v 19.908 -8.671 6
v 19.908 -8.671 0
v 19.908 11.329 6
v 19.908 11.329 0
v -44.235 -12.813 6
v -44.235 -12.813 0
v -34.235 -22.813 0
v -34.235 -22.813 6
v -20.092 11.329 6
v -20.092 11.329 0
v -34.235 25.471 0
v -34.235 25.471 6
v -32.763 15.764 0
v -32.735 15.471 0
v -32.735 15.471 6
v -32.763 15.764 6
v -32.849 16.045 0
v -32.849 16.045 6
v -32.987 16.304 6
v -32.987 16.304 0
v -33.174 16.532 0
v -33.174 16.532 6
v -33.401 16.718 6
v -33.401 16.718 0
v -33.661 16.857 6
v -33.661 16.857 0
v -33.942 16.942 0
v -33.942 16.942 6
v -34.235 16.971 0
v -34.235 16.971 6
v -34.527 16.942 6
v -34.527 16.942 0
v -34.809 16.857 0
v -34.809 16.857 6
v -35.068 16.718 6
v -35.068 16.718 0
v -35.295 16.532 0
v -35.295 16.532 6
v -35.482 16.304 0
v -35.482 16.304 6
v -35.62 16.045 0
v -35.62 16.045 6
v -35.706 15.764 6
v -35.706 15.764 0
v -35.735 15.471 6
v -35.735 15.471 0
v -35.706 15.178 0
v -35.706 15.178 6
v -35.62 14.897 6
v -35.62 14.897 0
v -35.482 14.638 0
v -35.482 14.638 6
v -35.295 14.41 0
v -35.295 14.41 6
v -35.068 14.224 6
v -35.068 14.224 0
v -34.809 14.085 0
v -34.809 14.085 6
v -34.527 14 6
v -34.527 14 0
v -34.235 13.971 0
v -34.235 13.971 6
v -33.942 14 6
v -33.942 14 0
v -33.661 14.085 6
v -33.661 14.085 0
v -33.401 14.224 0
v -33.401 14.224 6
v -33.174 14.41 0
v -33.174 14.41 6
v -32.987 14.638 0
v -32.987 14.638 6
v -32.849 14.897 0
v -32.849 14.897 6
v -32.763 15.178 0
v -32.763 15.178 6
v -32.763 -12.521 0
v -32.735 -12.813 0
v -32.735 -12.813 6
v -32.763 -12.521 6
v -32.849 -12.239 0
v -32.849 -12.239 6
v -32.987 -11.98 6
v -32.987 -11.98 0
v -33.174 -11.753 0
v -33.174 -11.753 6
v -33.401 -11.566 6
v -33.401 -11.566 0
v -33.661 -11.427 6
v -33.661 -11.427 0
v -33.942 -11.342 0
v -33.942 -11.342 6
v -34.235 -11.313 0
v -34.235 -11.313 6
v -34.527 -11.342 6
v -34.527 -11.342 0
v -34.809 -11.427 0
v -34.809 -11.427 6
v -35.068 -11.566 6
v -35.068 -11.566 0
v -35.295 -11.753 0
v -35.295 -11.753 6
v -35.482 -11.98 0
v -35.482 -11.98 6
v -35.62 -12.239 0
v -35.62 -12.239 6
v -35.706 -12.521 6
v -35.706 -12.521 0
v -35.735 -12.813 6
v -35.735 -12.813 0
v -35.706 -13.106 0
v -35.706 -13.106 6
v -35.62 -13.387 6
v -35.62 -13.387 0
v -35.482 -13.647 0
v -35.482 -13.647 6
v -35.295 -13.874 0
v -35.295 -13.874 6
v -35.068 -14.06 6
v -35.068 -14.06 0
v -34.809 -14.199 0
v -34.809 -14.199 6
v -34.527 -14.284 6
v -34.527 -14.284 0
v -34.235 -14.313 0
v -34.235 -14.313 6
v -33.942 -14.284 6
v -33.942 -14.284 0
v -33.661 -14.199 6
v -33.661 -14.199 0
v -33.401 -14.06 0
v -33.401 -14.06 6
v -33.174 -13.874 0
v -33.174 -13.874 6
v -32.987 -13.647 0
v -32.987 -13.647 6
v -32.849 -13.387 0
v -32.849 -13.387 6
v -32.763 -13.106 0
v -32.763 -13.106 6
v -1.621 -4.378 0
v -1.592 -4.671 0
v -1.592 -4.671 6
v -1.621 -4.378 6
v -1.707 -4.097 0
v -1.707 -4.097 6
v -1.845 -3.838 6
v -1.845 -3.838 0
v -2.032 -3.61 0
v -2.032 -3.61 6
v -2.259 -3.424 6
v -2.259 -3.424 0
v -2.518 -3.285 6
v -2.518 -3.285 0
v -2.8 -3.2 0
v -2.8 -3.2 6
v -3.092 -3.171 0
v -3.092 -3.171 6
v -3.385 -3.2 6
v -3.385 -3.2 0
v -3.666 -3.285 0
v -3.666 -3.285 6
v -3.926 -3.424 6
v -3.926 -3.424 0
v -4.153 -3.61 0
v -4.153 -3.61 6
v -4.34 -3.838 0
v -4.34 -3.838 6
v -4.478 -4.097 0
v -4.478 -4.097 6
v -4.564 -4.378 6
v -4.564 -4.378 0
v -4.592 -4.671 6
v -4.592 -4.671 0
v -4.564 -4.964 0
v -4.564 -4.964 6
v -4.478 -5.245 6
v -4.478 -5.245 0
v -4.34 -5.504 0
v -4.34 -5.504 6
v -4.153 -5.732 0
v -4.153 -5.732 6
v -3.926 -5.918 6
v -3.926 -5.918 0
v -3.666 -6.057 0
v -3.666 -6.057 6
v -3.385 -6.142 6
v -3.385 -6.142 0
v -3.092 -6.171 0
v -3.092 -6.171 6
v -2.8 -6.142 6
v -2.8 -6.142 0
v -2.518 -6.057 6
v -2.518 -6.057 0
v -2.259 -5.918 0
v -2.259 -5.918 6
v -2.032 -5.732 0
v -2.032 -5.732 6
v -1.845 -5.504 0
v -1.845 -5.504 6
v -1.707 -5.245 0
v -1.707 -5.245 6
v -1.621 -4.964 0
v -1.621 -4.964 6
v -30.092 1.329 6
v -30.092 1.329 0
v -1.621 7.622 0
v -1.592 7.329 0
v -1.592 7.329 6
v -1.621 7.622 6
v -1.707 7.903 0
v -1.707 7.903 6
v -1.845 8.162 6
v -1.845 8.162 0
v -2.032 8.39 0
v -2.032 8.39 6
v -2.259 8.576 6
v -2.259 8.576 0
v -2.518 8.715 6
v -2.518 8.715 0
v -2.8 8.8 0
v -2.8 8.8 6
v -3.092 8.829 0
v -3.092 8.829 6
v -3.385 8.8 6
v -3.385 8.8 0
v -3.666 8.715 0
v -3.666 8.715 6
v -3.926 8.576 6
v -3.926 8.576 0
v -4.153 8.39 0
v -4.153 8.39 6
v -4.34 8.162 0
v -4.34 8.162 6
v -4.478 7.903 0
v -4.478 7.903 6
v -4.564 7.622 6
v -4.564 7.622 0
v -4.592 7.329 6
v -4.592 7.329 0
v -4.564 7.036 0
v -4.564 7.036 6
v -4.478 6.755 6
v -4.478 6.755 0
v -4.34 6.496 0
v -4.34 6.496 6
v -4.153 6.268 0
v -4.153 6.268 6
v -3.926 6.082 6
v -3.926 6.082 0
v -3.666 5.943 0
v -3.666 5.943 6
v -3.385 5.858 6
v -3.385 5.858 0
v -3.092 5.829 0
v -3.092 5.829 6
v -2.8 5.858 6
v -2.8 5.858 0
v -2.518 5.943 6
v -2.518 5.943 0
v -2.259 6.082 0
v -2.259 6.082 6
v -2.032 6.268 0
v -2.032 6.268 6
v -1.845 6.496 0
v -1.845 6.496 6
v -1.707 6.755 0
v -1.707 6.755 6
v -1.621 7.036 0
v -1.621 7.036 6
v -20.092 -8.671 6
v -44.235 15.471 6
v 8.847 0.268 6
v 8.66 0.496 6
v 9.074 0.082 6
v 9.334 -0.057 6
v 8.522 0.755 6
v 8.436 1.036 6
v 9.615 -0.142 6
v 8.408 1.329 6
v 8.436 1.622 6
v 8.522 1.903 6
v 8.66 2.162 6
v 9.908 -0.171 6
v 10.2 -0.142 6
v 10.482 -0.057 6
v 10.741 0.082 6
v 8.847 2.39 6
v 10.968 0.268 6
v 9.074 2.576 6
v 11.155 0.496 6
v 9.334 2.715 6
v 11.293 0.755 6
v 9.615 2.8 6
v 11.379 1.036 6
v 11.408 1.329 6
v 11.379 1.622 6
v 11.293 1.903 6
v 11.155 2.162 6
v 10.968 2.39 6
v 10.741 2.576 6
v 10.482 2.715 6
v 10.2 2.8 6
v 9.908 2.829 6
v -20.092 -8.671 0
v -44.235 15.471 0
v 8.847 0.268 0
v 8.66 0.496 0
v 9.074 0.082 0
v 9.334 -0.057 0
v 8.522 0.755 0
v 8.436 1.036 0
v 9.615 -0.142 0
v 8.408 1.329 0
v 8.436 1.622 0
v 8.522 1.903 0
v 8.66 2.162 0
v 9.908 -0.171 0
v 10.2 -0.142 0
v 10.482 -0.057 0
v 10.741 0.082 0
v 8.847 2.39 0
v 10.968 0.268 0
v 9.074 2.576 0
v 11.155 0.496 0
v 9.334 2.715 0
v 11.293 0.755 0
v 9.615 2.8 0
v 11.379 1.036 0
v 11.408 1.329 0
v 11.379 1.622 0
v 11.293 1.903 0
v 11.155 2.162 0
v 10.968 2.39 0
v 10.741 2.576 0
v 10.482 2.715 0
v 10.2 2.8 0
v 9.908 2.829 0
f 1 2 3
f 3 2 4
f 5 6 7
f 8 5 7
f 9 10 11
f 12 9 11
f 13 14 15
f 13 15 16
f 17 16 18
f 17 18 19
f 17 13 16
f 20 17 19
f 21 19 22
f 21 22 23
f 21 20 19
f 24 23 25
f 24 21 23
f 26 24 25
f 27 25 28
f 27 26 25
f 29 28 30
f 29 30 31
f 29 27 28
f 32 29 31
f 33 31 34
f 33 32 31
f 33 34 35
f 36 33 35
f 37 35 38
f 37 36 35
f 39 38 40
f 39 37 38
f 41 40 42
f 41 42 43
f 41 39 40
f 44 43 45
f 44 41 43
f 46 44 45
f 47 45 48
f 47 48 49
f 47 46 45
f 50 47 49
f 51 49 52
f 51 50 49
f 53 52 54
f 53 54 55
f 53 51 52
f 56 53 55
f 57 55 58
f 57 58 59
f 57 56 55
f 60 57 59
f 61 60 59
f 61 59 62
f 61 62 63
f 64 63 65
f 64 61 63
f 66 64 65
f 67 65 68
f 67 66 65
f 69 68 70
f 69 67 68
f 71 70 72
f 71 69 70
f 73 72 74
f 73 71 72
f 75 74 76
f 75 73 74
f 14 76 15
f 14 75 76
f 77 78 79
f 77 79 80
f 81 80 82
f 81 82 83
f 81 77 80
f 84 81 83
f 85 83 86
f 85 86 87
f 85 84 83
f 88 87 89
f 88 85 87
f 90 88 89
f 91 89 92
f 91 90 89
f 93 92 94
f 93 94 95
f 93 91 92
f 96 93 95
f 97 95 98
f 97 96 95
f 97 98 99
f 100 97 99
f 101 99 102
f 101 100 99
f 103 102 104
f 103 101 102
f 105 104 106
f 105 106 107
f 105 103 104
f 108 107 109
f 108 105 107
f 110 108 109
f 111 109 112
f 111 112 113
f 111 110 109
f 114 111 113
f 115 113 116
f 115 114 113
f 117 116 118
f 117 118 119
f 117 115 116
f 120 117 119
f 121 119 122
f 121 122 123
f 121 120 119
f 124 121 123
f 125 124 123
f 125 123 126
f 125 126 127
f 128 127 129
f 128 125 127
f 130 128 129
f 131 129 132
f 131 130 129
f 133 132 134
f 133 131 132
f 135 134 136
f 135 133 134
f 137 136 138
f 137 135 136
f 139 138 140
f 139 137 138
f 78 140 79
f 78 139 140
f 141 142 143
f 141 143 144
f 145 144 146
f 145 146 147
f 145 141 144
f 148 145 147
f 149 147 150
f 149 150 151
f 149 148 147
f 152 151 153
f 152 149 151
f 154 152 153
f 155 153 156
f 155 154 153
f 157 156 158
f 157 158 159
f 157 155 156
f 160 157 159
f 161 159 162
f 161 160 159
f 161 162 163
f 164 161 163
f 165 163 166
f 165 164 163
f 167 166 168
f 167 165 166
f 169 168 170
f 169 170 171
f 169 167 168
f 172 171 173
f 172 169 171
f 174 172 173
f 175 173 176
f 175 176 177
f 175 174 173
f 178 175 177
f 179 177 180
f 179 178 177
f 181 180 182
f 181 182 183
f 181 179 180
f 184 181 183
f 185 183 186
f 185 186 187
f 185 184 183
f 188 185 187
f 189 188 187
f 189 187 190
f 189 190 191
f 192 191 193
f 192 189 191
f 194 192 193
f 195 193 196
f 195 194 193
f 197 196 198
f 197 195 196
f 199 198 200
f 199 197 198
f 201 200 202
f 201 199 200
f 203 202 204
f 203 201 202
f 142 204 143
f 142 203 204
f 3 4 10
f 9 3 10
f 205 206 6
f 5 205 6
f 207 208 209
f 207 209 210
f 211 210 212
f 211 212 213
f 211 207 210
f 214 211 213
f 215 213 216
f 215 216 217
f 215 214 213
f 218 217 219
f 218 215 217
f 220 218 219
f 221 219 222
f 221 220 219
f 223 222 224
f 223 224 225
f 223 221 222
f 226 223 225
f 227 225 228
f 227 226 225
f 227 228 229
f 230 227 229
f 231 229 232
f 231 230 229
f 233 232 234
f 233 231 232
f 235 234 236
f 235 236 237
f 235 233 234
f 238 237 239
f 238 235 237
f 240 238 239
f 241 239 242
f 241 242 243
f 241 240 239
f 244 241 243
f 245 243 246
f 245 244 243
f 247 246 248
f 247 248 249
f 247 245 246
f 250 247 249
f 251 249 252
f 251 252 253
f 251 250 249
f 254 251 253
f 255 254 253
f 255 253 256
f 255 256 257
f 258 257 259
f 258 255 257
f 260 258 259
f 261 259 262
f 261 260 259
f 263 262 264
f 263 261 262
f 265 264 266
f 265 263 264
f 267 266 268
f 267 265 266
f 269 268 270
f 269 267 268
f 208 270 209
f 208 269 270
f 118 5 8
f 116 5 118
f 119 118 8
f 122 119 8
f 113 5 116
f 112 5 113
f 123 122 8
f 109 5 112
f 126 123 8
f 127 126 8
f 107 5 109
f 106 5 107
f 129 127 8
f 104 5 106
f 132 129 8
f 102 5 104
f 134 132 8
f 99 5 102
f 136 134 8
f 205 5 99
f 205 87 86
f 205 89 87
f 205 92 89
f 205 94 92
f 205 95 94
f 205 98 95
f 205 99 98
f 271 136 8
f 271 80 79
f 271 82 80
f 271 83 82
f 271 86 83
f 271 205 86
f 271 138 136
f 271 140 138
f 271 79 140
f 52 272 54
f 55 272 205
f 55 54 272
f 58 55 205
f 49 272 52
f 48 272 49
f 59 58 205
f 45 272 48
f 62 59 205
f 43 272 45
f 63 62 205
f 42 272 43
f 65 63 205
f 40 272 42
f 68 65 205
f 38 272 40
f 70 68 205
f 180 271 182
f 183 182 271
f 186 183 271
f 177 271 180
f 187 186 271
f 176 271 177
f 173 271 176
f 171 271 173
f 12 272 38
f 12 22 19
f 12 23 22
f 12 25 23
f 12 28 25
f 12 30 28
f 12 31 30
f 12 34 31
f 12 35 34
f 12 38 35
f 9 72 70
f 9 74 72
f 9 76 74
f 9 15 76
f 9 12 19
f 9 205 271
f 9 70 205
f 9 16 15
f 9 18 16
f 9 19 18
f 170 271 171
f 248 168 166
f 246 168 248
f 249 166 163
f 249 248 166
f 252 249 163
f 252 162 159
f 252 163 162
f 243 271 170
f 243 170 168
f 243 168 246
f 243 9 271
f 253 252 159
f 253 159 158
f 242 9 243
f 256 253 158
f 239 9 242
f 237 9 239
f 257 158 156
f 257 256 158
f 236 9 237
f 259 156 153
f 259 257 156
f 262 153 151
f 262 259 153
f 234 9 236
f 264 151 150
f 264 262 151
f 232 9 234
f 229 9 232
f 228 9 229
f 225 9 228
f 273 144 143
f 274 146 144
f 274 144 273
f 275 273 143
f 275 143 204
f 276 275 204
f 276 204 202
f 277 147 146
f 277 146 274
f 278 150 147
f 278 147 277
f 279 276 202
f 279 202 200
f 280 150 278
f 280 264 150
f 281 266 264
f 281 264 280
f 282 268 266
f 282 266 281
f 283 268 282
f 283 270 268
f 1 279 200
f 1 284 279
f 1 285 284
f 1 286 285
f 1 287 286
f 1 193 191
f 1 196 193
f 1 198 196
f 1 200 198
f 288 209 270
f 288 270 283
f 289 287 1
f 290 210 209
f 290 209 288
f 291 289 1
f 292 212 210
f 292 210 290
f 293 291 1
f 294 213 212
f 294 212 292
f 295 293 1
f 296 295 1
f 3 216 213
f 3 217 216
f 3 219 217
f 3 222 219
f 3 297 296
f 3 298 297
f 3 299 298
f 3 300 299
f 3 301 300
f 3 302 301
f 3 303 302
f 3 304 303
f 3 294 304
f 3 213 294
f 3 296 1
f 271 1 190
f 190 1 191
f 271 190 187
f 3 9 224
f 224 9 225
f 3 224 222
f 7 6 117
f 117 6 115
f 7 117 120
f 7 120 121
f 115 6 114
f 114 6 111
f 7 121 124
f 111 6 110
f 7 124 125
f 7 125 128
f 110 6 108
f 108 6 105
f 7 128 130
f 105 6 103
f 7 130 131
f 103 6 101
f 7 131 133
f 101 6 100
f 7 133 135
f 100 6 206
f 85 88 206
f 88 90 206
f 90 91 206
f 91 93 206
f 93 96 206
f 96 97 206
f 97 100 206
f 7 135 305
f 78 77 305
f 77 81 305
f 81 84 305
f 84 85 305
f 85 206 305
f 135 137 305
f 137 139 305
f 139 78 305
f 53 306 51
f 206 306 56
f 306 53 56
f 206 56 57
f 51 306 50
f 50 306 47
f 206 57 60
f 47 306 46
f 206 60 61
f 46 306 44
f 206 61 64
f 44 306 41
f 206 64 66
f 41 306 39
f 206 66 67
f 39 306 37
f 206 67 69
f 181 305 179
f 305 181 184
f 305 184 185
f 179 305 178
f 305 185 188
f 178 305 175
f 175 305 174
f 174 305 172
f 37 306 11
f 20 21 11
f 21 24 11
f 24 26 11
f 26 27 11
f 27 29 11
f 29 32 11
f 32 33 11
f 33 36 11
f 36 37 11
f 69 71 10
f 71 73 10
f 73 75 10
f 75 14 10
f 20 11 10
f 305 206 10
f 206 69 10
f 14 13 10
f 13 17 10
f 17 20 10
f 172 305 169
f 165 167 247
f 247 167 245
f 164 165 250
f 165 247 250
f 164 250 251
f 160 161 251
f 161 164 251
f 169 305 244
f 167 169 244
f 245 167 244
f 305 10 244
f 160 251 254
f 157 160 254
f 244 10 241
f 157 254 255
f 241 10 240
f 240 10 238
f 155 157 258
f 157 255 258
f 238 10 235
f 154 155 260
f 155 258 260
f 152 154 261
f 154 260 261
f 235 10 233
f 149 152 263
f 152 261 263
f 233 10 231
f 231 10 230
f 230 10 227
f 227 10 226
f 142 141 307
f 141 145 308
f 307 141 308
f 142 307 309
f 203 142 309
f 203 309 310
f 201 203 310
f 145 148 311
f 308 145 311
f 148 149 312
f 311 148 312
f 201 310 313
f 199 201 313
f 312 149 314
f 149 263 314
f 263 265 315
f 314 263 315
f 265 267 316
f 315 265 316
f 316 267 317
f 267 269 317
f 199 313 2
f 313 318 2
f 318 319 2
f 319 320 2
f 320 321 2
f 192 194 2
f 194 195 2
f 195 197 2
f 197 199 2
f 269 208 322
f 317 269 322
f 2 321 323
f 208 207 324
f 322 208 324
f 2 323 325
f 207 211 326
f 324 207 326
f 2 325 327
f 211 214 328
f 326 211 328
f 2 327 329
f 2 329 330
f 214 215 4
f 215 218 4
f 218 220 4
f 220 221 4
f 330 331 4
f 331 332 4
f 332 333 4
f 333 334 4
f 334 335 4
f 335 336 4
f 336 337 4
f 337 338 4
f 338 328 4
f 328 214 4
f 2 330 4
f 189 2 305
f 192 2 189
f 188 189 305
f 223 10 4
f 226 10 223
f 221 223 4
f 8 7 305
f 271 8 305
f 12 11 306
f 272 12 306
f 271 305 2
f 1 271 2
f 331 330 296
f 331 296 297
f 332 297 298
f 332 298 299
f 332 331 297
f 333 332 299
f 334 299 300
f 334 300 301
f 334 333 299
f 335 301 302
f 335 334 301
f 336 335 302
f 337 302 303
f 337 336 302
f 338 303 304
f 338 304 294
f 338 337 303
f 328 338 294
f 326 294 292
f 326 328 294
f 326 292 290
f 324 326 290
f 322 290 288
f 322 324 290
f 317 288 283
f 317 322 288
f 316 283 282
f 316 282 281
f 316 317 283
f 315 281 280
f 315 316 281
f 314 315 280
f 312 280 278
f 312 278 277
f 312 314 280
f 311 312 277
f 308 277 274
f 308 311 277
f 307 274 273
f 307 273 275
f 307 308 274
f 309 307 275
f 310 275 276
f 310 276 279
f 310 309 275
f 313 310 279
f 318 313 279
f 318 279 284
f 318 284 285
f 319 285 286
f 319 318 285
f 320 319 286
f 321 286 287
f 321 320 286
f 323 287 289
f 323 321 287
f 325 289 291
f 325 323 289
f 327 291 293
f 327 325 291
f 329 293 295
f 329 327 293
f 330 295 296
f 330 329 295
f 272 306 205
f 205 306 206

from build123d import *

# Parameters (mm, degrees)
F0_R     = 1.5
F1_DEPTH = 6


with BuildPart() as f1:
    # F0 (on Top) → F1 (new body)
    with BuildSketch(Plane.XY):
        Polygon((-20.092445, 11.328948), (-34.234581, 25.471083), (-44.234581, 15.471083), (-30.092445, 1.328948), (-44.234581, -12.813188), (-34.234581, -22.813188), (-20.092445, -8.671052), (19.907555, -8.671052), (19.907555, 11.328948), align=None)
        with Locations((-34.234629, -12.813236)):
            Circle(F0_R, mode=Mode.SUBTRACT)
        with Locations((-3.092445, -4.671052)):
            Circle(F0_R, mode=Mode.SUBTRACT)
        with Locations((-34.234629, 15.471131)):
            Circle(F0_R, mode=Mode.SUBTRACT)
        with Locations((-3.092445, 7.328948)):
            Circle(F0_R, mode=Mode.SUBTRACT)
        with Locations((9.907555, 1.328948)):
            Circle(F0_R, mode=Mode.SUBTRACT)
    extrude(amount=F1_DEPTH)


solid = f1.part
